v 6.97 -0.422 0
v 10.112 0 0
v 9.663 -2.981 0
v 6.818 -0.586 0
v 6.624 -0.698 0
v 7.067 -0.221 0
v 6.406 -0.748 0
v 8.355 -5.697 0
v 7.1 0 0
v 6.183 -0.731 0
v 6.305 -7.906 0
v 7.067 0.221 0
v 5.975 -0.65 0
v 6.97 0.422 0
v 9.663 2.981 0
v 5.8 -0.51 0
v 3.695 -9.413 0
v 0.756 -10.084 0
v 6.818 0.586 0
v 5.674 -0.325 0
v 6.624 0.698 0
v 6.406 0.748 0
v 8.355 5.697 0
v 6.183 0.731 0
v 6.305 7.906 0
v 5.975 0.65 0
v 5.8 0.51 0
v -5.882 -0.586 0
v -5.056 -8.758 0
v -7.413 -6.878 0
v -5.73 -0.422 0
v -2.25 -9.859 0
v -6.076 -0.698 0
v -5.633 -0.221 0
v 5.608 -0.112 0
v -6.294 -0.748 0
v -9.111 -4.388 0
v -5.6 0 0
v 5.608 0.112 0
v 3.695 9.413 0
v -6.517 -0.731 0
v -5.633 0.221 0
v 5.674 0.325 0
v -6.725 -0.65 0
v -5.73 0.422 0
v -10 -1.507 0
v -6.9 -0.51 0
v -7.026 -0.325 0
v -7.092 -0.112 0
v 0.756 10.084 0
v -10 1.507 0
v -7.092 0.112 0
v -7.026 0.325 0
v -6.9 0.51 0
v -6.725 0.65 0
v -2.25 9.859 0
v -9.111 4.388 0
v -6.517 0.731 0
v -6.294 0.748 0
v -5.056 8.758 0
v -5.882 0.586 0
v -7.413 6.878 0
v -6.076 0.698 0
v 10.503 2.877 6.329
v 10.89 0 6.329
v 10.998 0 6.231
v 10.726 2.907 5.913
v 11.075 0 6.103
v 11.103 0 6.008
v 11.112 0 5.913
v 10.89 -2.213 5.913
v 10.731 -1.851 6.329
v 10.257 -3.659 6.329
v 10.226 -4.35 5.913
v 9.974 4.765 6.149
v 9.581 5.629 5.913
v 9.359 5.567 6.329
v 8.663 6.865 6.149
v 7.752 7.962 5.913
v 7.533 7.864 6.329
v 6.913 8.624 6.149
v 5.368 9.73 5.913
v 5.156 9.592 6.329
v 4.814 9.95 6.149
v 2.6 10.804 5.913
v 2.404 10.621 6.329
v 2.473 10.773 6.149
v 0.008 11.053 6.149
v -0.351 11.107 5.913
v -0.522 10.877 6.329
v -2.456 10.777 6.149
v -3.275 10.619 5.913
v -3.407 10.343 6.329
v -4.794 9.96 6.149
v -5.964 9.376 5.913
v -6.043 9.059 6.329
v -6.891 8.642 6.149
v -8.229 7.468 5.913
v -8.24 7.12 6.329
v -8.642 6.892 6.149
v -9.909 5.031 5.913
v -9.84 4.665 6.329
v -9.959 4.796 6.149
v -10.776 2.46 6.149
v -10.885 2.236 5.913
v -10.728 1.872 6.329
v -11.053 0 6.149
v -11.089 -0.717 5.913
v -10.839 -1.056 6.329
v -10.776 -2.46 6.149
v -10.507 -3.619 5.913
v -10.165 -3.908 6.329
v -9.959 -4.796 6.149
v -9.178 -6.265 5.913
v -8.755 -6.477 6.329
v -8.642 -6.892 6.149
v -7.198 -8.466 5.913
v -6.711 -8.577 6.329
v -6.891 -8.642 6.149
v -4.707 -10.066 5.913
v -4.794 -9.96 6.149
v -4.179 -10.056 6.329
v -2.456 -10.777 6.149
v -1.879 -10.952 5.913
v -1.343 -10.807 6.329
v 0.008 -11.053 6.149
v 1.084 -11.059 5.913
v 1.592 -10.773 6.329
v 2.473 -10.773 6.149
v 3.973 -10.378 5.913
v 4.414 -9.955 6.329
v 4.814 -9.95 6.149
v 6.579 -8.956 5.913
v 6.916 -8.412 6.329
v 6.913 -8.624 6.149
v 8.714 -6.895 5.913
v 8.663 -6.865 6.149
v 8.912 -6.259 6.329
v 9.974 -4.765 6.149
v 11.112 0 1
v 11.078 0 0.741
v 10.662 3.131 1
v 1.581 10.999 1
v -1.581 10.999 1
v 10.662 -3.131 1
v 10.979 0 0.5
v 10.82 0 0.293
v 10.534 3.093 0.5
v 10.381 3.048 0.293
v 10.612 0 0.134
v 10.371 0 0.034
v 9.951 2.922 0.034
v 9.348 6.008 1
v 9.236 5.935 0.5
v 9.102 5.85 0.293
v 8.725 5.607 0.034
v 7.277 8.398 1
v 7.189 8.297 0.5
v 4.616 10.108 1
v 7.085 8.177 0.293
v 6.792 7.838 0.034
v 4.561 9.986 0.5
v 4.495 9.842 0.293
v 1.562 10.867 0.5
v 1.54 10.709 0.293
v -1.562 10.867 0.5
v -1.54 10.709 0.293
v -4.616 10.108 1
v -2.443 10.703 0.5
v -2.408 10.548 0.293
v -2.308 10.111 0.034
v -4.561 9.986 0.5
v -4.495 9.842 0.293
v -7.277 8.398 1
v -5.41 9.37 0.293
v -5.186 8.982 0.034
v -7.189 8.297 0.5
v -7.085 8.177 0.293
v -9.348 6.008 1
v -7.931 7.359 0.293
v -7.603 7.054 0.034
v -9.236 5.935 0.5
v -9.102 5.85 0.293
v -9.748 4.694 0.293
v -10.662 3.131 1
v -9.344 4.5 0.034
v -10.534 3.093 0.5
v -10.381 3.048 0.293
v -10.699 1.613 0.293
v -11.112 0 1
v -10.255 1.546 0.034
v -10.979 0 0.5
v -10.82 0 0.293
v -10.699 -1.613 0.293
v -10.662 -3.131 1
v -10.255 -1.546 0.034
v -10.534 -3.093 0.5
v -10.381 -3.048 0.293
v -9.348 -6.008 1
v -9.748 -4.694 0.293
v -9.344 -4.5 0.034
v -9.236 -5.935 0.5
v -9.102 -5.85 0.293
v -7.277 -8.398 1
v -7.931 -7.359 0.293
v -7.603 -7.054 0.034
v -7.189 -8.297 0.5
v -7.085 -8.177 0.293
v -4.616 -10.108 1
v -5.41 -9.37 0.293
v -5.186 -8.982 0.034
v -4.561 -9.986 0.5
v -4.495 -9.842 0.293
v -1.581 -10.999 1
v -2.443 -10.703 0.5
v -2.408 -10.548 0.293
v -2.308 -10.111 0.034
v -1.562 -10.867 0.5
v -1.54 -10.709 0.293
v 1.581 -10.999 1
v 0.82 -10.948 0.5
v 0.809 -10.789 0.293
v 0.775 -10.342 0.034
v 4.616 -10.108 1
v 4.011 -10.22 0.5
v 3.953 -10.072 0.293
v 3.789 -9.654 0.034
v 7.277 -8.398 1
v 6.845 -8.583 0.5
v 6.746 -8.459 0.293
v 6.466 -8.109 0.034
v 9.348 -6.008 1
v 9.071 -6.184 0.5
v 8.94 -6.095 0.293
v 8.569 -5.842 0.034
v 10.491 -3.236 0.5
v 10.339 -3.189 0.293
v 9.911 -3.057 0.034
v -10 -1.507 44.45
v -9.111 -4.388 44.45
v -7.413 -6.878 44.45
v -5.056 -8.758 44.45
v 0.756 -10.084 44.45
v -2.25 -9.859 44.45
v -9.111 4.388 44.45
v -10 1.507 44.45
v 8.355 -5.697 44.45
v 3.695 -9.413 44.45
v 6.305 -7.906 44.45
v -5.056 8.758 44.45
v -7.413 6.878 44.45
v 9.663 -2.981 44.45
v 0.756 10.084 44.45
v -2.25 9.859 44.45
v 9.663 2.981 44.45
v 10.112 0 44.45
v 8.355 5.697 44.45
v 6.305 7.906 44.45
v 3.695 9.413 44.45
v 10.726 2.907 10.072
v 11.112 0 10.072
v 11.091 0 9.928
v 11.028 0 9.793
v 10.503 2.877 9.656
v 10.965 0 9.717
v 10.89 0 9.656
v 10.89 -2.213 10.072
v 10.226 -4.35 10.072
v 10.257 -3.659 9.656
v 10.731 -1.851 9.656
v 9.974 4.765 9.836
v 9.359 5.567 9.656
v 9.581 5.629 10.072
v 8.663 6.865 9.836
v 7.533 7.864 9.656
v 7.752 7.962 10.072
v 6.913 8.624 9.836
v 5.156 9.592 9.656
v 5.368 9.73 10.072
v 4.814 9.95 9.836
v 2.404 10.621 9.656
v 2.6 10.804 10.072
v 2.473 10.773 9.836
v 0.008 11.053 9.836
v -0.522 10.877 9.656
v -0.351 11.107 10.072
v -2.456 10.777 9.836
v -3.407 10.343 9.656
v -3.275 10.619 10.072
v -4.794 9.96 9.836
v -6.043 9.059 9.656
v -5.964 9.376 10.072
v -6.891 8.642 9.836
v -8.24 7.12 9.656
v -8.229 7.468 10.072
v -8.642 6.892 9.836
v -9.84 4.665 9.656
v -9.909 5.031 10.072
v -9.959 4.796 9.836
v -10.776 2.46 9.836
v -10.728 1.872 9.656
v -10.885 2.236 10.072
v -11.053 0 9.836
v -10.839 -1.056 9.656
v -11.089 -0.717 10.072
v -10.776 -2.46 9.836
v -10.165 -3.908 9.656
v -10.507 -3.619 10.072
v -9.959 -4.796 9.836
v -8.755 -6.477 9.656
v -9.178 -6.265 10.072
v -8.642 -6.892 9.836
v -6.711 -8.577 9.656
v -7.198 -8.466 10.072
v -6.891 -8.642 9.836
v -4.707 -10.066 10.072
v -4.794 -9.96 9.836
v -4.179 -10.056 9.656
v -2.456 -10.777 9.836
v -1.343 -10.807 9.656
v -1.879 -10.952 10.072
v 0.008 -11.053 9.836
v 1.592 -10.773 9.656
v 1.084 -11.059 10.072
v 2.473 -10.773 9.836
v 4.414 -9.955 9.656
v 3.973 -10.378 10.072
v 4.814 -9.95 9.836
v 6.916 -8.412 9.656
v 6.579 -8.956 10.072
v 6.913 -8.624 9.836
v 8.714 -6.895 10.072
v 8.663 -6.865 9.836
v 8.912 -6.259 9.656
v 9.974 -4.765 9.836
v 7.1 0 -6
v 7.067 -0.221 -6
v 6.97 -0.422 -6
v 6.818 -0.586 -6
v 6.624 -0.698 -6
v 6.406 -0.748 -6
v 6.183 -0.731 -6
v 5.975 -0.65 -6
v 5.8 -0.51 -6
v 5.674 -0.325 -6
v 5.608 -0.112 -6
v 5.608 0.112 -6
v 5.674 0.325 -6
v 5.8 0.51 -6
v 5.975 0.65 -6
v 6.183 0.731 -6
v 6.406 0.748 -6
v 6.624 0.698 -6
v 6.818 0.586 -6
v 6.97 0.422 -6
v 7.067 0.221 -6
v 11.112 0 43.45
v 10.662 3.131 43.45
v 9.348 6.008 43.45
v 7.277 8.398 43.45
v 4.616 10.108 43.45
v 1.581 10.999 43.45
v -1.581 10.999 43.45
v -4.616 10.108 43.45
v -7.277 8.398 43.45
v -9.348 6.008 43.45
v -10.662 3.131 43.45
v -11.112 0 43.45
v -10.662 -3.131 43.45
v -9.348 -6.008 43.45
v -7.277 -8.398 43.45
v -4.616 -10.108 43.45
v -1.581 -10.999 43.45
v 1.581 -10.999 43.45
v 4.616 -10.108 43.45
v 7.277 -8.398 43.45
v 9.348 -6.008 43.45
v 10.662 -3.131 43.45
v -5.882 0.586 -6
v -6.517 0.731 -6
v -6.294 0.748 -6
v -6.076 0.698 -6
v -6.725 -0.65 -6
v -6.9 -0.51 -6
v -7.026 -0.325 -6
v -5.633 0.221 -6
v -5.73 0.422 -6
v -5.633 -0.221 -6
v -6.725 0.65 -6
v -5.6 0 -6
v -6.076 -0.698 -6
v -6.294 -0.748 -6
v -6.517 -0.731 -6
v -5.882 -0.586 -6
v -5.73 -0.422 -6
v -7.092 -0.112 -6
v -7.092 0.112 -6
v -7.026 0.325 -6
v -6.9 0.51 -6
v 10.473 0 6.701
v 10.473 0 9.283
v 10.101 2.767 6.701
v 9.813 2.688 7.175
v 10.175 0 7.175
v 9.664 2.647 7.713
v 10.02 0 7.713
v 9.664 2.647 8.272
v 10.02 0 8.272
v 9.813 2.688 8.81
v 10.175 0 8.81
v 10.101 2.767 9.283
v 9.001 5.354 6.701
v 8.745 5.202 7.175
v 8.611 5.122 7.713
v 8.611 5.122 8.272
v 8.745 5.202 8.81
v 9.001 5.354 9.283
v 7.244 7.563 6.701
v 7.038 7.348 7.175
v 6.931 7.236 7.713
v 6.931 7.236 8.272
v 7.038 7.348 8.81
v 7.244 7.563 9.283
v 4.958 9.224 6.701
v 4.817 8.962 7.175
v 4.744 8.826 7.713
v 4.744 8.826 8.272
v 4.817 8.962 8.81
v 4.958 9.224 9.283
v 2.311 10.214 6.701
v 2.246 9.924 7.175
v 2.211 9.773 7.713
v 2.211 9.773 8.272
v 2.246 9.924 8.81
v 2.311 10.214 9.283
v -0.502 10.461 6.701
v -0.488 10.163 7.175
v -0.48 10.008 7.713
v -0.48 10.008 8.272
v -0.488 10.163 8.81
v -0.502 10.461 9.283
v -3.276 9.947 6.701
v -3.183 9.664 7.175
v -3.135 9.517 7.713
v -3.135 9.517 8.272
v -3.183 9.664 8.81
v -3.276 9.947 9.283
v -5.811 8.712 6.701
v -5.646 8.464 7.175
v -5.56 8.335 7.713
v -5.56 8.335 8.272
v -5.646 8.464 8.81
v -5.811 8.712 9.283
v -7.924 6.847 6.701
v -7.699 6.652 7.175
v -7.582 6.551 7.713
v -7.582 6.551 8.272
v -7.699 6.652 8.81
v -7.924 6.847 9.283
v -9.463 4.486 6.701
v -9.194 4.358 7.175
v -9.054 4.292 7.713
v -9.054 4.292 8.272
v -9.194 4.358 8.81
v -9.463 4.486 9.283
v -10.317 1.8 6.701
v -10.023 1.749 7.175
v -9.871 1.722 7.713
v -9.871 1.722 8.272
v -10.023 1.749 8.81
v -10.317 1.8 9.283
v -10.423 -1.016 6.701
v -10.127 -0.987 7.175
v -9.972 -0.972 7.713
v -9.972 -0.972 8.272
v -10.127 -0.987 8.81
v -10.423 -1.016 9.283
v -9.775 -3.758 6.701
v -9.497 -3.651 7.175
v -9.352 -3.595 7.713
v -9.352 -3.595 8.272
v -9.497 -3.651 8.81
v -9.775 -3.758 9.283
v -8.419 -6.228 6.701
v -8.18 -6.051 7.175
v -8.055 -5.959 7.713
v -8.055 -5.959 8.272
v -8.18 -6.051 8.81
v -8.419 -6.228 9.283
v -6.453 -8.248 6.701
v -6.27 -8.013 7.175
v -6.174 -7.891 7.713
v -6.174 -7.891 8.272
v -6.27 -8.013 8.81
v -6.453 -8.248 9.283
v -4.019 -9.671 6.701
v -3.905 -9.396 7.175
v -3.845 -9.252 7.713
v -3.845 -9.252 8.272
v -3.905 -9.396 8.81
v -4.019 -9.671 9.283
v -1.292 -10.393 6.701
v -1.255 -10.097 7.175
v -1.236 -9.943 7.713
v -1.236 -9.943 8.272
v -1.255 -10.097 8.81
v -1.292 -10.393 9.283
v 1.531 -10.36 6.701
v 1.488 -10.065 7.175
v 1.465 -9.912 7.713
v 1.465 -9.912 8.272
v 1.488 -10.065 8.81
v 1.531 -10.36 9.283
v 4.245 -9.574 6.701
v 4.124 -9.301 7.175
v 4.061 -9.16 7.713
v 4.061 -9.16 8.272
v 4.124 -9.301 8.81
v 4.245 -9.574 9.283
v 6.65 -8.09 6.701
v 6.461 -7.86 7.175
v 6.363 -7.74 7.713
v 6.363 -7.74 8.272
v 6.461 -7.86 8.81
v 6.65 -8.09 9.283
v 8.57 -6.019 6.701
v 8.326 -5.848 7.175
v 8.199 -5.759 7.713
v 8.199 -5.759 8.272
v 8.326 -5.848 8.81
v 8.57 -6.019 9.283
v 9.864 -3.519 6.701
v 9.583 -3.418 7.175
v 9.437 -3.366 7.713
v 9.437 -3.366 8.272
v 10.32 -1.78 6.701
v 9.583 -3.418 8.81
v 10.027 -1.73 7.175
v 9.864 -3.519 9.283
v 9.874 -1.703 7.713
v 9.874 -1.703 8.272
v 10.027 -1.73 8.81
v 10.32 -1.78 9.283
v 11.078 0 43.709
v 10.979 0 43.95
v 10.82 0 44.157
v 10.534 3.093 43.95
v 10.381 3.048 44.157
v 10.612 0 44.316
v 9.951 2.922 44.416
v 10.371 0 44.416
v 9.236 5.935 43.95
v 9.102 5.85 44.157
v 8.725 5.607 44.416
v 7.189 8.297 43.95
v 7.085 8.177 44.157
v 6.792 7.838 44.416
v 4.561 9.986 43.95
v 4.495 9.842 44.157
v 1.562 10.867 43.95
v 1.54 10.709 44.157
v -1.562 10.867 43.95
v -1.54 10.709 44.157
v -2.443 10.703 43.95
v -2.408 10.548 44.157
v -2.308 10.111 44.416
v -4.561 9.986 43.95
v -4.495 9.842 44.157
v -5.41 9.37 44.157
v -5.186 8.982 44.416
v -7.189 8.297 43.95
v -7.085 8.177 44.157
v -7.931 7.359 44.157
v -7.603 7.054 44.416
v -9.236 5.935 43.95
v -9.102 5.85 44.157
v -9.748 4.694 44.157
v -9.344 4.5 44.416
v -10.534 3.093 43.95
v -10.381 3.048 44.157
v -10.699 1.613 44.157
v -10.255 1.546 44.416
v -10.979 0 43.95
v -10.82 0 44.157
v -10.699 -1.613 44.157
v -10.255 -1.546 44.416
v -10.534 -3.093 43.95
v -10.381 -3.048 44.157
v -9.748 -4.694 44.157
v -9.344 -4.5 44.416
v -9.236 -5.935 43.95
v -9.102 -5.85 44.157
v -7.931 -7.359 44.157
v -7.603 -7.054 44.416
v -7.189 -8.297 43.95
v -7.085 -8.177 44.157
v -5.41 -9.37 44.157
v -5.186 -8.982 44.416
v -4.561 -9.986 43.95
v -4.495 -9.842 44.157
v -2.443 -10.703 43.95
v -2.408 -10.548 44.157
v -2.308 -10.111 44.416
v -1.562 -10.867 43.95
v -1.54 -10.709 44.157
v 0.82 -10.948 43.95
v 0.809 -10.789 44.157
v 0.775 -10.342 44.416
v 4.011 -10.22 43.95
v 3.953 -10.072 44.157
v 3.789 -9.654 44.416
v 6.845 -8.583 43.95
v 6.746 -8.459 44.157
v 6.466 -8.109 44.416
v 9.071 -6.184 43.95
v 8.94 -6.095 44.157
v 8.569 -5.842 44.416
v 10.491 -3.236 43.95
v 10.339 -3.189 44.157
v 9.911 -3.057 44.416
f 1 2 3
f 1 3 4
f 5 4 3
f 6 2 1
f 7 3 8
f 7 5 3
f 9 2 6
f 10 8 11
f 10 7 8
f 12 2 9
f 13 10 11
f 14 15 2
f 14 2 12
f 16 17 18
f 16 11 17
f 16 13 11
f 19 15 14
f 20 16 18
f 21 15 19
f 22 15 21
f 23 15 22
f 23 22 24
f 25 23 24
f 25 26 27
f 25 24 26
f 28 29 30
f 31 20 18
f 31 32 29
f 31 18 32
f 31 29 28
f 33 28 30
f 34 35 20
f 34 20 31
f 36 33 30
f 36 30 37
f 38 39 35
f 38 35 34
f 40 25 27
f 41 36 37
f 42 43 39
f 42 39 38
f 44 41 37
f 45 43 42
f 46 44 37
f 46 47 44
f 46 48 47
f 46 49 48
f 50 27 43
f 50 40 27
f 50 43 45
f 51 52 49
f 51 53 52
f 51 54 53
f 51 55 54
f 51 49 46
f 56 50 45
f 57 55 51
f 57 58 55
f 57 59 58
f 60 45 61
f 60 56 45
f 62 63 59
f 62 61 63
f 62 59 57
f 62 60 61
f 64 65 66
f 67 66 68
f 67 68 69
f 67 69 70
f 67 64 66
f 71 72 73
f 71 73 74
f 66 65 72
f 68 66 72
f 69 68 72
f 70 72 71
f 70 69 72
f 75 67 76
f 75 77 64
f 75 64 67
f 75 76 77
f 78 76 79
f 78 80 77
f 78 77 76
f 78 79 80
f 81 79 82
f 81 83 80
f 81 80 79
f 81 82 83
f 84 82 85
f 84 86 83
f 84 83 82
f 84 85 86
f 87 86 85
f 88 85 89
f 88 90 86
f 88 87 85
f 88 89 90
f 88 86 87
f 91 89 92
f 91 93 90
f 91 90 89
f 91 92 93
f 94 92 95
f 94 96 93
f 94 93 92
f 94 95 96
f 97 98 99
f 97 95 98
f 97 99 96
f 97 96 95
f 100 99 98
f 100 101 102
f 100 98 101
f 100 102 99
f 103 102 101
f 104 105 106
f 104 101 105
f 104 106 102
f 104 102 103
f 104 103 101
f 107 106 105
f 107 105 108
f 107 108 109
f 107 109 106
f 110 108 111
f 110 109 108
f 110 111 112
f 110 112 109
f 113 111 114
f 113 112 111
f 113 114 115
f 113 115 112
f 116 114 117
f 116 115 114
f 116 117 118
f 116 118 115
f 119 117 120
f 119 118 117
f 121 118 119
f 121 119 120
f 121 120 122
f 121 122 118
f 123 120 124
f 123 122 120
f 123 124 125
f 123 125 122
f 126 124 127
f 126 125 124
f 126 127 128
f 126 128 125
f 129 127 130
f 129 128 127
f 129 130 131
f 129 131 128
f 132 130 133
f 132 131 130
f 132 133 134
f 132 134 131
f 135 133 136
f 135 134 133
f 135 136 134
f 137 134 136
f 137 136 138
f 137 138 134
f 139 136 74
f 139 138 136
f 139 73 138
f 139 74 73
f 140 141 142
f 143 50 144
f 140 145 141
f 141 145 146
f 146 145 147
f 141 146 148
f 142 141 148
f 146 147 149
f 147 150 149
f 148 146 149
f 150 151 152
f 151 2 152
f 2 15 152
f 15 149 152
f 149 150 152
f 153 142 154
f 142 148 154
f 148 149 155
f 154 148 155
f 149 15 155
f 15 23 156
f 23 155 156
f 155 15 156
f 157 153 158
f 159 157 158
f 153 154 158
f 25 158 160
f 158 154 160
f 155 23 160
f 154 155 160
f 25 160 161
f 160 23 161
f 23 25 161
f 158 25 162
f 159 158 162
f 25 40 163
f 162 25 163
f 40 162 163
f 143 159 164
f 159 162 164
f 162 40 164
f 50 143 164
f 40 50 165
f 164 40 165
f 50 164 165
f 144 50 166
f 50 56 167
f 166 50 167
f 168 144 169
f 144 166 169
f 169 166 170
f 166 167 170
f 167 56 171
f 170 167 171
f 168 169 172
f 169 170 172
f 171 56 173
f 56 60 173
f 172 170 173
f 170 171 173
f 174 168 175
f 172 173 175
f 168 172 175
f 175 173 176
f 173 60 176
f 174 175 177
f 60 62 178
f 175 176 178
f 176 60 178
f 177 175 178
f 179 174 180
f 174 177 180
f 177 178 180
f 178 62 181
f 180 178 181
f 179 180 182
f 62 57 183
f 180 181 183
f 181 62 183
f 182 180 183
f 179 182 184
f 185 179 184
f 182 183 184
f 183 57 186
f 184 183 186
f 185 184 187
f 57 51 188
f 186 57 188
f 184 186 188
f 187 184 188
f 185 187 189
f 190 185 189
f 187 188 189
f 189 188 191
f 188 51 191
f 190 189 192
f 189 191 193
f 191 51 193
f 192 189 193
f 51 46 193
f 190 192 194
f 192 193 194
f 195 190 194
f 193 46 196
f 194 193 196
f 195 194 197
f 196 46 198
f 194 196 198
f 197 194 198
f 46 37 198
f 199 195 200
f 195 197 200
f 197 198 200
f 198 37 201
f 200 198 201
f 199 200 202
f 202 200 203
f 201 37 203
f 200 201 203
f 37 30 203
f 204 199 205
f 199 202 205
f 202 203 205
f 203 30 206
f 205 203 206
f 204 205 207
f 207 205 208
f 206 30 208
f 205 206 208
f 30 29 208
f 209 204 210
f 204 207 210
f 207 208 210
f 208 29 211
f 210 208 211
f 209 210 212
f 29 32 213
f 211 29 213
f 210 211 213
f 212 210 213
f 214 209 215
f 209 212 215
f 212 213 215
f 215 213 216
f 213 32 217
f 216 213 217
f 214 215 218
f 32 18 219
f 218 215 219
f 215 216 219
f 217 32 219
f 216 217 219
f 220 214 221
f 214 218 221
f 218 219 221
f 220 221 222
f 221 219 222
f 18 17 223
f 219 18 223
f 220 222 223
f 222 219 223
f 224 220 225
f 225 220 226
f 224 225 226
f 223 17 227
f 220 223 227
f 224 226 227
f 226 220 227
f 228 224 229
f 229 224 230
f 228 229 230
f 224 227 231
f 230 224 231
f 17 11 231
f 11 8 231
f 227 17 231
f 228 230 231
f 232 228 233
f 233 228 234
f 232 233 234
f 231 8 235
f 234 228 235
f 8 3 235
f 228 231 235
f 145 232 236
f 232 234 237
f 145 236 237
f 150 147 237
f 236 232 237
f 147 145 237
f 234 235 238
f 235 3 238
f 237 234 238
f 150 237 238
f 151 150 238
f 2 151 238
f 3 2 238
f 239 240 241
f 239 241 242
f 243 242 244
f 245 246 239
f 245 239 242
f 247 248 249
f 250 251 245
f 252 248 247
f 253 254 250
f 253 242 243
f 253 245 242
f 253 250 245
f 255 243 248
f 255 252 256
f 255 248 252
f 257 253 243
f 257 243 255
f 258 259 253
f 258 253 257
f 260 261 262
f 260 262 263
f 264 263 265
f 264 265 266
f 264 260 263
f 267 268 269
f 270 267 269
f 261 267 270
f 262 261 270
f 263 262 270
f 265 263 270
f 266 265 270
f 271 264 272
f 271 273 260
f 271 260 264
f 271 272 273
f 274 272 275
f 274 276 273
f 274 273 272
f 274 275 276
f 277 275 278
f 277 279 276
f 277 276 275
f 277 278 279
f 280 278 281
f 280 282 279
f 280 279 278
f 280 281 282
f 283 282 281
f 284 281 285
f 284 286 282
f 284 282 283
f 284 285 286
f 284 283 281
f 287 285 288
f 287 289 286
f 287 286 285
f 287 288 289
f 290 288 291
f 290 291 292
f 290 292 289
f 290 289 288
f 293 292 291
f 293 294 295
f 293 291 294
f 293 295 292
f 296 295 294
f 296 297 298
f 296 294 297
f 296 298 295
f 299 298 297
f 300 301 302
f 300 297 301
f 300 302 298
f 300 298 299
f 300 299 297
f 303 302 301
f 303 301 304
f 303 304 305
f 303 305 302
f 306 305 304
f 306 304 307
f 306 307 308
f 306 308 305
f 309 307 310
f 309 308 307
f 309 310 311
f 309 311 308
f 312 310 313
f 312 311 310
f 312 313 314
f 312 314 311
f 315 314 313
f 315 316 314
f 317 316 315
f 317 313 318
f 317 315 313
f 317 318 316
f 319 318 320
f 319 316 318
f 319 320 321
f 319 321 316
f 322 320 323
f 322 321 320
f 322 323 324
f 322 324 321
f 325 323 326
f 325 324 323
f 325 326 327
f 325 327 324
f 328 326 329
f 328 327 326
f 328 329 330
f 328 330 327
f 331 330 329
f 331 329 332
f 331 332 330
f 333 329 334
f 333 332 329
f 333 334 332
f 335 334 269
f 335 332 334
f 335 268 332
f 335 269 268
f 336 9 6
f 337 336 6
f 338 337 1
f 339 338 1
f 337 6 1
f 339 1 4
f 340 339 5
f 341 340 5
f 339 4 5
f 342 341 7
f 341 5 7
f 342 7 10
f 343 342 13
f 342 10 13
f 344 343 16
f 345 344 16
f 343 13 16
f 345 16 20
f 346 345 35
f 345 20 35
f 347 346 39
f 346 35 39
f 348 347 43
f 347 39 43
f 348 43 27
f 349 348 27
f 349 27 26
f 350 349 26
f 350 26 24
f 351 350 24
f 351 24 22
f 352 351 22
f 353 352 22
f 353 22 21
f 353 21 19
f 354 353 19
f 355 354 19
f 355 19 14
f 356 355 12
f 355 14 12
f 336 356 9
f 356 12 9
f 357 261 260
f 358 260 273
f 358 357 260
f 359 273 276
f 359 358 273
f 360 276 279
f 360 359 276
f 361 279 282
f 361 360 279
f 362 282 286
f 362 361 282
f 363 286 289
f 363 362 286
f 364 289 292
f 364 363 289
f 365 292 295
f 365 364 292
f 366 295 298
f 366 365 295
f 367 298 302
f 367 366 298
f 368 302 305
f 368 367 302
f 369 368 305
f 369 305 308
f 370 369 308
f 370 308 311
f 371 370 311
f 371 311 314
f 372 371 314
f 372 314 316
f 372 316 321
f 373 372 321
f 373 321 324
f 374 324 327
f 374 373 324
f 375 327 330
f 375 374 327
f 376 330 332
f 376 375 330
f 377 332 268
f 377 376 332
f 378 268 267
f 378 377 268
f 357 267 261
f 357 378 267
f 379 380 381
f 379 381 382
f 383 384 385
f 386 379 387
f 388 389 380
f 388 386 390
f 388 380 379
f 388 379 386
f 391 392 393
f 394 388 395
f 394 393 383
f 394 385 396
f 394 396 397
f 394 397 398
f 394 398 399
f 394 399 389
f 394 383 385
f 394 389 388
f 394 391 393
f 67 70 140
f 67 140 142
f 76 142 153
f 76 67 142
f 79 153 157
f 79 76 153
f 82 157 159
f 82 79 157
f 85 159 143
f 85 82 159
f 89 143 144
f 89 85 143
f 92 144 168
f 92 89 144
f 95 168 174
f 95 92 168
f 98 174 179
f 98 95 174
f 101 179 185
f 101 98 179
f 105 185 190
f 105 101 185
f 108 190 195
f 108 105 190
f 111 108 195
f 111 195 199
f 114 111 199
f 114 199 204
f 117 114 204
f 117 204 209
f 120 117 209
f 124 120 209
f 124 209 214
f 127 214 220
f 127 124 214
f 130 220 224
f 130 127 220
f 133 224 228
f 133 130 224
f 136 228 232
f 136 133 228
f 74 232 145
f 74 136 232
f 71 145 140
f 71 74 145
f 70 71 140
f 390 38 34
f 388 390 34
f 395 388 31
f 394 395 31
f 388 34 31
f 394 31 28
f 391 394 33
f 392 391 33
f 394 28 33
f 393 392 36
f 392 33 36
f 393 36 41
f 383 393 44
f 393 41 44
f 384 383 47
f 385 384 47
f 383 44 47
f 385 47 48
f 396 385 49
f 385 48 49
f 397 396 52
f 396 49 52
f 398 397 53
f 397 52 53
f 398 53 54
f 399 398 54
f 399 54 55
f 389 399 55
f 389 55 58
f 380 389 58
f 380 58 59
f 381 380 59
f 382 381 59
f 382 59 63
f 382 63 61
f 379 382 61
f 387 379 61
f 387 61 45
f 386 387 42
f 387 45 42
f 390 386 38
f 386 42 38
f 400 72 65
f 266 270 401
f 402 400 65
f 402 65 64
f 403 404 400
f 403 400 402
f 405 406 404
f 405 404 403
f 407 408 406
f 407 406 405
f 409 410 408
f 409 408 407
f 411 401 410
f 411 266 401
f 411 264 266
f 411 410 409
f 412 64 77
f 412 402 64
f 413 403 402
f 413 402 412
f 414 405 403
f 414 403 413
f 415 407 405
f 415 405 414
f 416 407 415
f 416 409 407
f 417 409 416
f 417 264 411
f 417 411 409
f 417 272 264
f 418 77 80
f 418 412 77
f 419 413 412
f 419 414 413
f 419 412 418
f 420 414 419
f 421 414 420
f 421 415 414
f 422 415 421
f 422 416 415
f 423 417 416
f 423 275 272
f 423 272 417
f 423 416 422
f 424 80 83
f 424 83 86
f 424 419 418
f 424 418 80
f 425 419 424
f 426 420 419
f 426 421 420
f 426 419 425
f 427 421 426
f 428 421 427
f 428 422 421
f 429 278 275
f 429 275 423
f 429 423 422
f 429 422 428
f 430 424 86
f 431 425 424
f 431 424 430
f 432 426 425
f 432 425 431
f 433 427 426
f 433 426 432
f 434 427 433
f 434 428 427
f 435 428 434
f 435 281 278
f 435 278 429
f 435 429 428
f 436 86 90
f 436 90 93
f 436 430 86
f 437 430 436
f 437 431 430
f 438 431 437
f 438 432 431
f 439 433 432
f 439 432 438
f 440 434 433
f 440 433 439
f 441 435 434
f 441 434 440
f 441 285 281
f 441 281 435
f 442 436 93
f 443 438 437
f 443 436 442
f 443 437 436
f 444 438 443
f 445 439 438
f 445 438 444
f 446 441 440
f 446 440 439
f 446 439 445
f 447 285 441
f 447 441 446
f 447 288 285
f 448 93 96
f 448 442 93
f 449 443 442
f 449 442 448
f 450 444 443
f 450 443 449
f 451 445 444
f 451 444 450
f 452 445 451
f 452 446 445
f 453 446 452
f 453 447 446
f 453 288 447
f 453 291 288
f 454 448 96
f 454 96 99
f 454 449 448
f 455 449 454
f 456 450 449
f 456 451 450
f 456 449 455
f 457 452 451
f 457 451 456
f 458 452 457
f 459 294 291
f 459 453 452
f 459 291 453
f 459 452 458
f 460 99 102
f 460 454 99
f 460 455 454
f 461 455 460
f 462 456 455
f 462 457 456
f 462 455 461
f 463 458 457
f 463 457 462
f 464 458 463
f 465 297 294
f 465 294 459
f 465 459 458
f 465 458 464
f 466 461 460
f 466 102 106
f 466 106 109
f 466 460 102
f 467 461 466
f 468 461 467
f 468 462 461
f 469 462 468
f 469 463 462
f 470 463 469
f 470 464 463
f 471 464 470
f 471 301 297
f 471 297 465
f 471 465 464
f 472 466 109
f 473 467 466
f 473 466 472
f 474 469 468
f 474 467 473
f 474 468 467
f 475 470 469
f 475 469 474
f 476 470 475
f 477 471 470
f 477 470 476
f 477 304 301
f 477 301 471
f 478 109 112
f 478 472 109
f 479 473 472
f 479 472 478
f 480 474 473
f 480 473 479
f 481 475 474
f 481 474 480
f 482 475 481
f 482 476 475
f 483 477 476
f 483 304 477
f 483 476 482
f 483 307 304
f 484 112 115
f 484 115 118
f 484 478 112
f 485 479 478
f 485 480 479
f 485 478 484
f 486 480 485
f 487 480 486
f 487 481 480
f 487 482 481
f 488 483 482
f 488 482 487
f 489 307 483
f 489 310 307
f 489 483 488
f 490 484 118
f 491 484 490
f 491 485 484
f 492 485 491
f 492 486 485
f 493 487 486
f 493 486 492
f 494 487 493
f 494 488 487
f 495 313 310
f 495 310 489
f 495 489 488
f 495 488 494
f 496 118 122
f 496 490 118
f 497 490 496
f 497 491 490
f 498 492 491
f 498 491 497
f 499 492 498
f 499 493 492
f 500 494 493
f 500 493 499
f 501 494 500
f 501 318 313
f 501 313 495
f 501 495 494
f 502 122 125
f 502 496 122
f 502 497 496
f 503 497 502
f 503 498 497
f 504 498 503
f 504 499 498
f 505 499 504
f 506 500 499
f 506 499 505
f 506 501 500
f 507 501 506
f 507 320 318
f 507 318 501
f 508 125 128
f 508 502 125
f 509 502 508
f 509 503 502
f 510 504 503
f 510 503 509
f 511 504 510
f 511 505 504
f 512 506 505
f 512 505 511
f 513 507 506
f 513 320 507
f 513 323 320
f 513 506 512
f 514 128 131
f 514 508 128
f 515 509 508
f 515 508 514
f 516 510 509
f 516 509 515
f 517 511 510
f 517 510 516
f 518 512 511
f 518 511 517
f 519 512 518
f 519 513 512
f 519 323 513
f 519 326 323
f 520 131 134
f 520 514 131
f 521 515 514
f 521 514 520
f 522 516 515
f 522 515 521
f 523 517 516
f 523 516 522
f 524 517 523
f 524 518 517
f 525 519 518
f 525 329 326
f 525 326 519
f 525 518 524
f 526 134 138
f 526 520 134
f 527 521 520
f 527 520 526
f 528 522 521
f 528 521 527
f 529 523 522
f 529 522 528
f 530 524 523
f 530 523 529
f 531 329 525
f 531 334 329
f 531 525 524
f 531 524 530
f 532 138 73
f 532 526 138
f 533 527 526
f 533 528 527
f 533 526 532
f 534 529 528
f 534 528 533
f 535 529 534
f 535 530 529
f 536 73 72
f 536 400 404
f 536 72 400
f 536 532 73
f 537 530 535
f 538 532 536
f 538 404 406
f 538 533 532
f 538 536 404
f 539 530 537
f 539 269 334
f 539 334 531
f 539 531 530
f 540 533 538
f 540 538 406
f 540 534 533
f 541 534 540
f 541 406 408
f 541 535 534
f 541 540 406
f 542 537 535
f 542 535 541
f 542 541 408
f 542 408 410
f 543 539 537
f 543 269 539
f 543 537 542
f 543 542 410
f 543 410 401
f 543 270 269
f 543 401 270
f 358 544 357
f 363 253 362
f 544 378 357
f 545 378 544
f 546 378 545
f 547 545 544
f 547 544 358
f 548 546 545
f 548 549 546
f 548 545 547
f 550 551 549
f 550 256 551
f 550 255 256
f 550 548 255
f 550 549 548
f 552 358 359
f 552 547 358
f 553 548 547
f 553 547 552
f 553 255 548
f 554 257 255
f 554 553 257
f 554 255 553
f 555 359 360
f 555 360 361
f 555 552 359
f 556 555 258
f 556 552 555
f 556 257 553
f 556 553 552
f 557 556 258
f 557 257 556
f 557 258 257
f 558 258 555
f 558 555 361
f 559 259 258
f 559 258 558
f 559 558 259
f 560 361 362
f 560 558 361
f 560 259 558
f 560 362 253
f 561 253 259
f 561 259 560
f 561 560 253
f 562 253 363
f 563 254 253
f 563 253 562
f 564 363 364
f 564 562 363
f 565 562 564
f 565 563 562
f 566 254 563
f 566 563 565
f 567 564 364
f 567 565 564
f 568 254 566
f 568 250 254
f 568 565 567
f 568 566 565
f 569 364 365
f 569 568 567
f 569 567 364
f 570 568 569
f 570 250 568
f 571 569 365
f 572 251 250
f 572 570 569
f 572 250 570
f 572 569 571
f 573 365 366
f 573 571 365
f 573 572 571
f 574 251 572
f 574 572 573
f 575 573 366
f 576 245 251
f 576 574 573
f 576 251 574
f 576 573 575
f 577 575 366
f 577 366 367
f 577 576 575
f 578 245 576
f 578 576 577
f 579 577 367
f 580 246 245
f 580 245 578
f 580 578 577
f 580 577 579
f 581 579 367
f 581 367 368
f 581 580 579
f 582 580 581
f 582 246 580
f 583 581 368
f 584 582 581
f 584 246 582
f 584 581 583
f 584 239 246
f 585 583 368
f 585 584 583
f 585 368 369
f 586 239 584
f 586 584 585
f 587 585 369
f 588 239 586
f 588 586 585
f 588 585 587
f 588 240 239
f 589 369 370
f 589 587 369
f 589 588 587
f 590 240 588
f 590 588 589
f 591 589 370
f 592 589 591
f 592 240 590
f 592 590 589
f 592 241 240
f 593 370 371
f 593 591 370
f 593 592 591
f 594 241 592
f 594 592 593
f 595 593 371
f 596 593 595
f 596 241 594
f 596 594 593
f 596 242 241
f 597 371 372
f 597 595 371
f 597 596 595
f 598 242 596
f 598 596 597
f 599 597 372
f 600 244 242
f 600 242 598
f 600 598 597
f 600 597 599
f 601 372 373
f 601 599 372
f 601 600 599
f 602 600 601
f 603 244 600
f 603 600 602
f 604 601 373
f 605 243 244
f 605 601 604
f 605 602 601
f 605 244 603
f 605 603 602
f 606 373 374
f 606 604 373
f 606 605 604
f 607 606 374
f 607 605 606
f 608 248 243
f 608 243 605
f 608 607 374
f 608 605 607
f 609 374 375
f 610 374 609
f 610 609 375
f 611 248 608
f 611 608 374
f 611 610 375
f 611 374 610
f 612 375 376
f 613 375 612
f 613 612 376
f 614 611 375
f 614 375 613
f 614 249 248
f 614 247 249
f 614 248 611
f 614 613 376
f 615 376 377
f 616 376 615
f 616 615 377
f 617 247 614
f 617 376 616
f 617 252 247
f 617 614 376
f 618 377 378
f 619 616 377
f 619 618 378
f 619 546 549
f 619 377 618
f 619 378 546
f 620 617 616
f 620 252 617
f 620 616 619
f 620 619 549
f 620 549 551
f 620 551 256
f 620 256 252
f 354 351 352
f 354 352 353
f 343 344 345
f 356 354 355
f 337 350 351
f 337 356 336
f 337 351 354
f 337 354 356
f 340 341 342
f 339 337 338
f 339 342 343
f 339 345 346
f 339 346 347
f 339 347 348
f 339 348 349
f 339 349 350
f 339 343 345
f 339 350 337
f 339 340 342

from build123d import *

# Parameters (mm, degrees)
F2_R     = 1
F3_R     = 0.5
F4_R     = 1
F5_R     = 0.75
F6_DEPTH = 6


with BuildPart() as f1:
    # F0 (on Front) → F1 (revolve)
    with BuildSketch(Plane.XZ):
        with BuildLine():
            Line((0, 44.45), (0, 0))
            Line((0, 0), (11.1125, 0))
            Line((11.1125, 0), (11.1125, 6.2))
            ThreePointArc((11.1125, 6.2), (10, 7.992301), (11.1125, 9.784602))
            Line((11.1125, 9.784602), (11.1125, 44.45))
            Line((11.1125, 44.45), (0, 44.45))
        make_face()
    revolve(axis=Axis((0, 0, 22.225), (0, 0, 1)))

    # F2
    f2_edges = [f1.edges().sort_by_distance(p)[0] for p in [
        (-11.1125, 0, 44.45),
    ]]
    fillet(f2_edges, radius=F2_R)

    # F3
    f3_edges = [f1.edges().sort_by_distance(p)[0] for p in [
        (11.1125, 0, 26.617301),
        (-11.1125, 0, 43.45),
        (-11.1125, 0, 9.784602),
        (-11.1125, 0, 6.2),
    ]]
    fillet(f3_edges, radius=F3_R)

    # F4
    f4_edges = [f1.edges().sort_by_distance(p)[0] for p in [
        (-11.1125, 0, 0),
    ]]
    fillet(f4_edges, radius=F4_R)

    # F5 (on face) → F6 (join)
    with BuildSketch(Plane(origin=(0, 0, 0), x_dir=(1, 0, 0), z_dir=(0, 0, -1))):
        with Locations((-6.35, 0)):
            Circle(F5_R)
        with Locations((6.35, 0)):
            Circle(F5_R)
    extrude(amount=F6_DEPTH)


solid = f1.part
